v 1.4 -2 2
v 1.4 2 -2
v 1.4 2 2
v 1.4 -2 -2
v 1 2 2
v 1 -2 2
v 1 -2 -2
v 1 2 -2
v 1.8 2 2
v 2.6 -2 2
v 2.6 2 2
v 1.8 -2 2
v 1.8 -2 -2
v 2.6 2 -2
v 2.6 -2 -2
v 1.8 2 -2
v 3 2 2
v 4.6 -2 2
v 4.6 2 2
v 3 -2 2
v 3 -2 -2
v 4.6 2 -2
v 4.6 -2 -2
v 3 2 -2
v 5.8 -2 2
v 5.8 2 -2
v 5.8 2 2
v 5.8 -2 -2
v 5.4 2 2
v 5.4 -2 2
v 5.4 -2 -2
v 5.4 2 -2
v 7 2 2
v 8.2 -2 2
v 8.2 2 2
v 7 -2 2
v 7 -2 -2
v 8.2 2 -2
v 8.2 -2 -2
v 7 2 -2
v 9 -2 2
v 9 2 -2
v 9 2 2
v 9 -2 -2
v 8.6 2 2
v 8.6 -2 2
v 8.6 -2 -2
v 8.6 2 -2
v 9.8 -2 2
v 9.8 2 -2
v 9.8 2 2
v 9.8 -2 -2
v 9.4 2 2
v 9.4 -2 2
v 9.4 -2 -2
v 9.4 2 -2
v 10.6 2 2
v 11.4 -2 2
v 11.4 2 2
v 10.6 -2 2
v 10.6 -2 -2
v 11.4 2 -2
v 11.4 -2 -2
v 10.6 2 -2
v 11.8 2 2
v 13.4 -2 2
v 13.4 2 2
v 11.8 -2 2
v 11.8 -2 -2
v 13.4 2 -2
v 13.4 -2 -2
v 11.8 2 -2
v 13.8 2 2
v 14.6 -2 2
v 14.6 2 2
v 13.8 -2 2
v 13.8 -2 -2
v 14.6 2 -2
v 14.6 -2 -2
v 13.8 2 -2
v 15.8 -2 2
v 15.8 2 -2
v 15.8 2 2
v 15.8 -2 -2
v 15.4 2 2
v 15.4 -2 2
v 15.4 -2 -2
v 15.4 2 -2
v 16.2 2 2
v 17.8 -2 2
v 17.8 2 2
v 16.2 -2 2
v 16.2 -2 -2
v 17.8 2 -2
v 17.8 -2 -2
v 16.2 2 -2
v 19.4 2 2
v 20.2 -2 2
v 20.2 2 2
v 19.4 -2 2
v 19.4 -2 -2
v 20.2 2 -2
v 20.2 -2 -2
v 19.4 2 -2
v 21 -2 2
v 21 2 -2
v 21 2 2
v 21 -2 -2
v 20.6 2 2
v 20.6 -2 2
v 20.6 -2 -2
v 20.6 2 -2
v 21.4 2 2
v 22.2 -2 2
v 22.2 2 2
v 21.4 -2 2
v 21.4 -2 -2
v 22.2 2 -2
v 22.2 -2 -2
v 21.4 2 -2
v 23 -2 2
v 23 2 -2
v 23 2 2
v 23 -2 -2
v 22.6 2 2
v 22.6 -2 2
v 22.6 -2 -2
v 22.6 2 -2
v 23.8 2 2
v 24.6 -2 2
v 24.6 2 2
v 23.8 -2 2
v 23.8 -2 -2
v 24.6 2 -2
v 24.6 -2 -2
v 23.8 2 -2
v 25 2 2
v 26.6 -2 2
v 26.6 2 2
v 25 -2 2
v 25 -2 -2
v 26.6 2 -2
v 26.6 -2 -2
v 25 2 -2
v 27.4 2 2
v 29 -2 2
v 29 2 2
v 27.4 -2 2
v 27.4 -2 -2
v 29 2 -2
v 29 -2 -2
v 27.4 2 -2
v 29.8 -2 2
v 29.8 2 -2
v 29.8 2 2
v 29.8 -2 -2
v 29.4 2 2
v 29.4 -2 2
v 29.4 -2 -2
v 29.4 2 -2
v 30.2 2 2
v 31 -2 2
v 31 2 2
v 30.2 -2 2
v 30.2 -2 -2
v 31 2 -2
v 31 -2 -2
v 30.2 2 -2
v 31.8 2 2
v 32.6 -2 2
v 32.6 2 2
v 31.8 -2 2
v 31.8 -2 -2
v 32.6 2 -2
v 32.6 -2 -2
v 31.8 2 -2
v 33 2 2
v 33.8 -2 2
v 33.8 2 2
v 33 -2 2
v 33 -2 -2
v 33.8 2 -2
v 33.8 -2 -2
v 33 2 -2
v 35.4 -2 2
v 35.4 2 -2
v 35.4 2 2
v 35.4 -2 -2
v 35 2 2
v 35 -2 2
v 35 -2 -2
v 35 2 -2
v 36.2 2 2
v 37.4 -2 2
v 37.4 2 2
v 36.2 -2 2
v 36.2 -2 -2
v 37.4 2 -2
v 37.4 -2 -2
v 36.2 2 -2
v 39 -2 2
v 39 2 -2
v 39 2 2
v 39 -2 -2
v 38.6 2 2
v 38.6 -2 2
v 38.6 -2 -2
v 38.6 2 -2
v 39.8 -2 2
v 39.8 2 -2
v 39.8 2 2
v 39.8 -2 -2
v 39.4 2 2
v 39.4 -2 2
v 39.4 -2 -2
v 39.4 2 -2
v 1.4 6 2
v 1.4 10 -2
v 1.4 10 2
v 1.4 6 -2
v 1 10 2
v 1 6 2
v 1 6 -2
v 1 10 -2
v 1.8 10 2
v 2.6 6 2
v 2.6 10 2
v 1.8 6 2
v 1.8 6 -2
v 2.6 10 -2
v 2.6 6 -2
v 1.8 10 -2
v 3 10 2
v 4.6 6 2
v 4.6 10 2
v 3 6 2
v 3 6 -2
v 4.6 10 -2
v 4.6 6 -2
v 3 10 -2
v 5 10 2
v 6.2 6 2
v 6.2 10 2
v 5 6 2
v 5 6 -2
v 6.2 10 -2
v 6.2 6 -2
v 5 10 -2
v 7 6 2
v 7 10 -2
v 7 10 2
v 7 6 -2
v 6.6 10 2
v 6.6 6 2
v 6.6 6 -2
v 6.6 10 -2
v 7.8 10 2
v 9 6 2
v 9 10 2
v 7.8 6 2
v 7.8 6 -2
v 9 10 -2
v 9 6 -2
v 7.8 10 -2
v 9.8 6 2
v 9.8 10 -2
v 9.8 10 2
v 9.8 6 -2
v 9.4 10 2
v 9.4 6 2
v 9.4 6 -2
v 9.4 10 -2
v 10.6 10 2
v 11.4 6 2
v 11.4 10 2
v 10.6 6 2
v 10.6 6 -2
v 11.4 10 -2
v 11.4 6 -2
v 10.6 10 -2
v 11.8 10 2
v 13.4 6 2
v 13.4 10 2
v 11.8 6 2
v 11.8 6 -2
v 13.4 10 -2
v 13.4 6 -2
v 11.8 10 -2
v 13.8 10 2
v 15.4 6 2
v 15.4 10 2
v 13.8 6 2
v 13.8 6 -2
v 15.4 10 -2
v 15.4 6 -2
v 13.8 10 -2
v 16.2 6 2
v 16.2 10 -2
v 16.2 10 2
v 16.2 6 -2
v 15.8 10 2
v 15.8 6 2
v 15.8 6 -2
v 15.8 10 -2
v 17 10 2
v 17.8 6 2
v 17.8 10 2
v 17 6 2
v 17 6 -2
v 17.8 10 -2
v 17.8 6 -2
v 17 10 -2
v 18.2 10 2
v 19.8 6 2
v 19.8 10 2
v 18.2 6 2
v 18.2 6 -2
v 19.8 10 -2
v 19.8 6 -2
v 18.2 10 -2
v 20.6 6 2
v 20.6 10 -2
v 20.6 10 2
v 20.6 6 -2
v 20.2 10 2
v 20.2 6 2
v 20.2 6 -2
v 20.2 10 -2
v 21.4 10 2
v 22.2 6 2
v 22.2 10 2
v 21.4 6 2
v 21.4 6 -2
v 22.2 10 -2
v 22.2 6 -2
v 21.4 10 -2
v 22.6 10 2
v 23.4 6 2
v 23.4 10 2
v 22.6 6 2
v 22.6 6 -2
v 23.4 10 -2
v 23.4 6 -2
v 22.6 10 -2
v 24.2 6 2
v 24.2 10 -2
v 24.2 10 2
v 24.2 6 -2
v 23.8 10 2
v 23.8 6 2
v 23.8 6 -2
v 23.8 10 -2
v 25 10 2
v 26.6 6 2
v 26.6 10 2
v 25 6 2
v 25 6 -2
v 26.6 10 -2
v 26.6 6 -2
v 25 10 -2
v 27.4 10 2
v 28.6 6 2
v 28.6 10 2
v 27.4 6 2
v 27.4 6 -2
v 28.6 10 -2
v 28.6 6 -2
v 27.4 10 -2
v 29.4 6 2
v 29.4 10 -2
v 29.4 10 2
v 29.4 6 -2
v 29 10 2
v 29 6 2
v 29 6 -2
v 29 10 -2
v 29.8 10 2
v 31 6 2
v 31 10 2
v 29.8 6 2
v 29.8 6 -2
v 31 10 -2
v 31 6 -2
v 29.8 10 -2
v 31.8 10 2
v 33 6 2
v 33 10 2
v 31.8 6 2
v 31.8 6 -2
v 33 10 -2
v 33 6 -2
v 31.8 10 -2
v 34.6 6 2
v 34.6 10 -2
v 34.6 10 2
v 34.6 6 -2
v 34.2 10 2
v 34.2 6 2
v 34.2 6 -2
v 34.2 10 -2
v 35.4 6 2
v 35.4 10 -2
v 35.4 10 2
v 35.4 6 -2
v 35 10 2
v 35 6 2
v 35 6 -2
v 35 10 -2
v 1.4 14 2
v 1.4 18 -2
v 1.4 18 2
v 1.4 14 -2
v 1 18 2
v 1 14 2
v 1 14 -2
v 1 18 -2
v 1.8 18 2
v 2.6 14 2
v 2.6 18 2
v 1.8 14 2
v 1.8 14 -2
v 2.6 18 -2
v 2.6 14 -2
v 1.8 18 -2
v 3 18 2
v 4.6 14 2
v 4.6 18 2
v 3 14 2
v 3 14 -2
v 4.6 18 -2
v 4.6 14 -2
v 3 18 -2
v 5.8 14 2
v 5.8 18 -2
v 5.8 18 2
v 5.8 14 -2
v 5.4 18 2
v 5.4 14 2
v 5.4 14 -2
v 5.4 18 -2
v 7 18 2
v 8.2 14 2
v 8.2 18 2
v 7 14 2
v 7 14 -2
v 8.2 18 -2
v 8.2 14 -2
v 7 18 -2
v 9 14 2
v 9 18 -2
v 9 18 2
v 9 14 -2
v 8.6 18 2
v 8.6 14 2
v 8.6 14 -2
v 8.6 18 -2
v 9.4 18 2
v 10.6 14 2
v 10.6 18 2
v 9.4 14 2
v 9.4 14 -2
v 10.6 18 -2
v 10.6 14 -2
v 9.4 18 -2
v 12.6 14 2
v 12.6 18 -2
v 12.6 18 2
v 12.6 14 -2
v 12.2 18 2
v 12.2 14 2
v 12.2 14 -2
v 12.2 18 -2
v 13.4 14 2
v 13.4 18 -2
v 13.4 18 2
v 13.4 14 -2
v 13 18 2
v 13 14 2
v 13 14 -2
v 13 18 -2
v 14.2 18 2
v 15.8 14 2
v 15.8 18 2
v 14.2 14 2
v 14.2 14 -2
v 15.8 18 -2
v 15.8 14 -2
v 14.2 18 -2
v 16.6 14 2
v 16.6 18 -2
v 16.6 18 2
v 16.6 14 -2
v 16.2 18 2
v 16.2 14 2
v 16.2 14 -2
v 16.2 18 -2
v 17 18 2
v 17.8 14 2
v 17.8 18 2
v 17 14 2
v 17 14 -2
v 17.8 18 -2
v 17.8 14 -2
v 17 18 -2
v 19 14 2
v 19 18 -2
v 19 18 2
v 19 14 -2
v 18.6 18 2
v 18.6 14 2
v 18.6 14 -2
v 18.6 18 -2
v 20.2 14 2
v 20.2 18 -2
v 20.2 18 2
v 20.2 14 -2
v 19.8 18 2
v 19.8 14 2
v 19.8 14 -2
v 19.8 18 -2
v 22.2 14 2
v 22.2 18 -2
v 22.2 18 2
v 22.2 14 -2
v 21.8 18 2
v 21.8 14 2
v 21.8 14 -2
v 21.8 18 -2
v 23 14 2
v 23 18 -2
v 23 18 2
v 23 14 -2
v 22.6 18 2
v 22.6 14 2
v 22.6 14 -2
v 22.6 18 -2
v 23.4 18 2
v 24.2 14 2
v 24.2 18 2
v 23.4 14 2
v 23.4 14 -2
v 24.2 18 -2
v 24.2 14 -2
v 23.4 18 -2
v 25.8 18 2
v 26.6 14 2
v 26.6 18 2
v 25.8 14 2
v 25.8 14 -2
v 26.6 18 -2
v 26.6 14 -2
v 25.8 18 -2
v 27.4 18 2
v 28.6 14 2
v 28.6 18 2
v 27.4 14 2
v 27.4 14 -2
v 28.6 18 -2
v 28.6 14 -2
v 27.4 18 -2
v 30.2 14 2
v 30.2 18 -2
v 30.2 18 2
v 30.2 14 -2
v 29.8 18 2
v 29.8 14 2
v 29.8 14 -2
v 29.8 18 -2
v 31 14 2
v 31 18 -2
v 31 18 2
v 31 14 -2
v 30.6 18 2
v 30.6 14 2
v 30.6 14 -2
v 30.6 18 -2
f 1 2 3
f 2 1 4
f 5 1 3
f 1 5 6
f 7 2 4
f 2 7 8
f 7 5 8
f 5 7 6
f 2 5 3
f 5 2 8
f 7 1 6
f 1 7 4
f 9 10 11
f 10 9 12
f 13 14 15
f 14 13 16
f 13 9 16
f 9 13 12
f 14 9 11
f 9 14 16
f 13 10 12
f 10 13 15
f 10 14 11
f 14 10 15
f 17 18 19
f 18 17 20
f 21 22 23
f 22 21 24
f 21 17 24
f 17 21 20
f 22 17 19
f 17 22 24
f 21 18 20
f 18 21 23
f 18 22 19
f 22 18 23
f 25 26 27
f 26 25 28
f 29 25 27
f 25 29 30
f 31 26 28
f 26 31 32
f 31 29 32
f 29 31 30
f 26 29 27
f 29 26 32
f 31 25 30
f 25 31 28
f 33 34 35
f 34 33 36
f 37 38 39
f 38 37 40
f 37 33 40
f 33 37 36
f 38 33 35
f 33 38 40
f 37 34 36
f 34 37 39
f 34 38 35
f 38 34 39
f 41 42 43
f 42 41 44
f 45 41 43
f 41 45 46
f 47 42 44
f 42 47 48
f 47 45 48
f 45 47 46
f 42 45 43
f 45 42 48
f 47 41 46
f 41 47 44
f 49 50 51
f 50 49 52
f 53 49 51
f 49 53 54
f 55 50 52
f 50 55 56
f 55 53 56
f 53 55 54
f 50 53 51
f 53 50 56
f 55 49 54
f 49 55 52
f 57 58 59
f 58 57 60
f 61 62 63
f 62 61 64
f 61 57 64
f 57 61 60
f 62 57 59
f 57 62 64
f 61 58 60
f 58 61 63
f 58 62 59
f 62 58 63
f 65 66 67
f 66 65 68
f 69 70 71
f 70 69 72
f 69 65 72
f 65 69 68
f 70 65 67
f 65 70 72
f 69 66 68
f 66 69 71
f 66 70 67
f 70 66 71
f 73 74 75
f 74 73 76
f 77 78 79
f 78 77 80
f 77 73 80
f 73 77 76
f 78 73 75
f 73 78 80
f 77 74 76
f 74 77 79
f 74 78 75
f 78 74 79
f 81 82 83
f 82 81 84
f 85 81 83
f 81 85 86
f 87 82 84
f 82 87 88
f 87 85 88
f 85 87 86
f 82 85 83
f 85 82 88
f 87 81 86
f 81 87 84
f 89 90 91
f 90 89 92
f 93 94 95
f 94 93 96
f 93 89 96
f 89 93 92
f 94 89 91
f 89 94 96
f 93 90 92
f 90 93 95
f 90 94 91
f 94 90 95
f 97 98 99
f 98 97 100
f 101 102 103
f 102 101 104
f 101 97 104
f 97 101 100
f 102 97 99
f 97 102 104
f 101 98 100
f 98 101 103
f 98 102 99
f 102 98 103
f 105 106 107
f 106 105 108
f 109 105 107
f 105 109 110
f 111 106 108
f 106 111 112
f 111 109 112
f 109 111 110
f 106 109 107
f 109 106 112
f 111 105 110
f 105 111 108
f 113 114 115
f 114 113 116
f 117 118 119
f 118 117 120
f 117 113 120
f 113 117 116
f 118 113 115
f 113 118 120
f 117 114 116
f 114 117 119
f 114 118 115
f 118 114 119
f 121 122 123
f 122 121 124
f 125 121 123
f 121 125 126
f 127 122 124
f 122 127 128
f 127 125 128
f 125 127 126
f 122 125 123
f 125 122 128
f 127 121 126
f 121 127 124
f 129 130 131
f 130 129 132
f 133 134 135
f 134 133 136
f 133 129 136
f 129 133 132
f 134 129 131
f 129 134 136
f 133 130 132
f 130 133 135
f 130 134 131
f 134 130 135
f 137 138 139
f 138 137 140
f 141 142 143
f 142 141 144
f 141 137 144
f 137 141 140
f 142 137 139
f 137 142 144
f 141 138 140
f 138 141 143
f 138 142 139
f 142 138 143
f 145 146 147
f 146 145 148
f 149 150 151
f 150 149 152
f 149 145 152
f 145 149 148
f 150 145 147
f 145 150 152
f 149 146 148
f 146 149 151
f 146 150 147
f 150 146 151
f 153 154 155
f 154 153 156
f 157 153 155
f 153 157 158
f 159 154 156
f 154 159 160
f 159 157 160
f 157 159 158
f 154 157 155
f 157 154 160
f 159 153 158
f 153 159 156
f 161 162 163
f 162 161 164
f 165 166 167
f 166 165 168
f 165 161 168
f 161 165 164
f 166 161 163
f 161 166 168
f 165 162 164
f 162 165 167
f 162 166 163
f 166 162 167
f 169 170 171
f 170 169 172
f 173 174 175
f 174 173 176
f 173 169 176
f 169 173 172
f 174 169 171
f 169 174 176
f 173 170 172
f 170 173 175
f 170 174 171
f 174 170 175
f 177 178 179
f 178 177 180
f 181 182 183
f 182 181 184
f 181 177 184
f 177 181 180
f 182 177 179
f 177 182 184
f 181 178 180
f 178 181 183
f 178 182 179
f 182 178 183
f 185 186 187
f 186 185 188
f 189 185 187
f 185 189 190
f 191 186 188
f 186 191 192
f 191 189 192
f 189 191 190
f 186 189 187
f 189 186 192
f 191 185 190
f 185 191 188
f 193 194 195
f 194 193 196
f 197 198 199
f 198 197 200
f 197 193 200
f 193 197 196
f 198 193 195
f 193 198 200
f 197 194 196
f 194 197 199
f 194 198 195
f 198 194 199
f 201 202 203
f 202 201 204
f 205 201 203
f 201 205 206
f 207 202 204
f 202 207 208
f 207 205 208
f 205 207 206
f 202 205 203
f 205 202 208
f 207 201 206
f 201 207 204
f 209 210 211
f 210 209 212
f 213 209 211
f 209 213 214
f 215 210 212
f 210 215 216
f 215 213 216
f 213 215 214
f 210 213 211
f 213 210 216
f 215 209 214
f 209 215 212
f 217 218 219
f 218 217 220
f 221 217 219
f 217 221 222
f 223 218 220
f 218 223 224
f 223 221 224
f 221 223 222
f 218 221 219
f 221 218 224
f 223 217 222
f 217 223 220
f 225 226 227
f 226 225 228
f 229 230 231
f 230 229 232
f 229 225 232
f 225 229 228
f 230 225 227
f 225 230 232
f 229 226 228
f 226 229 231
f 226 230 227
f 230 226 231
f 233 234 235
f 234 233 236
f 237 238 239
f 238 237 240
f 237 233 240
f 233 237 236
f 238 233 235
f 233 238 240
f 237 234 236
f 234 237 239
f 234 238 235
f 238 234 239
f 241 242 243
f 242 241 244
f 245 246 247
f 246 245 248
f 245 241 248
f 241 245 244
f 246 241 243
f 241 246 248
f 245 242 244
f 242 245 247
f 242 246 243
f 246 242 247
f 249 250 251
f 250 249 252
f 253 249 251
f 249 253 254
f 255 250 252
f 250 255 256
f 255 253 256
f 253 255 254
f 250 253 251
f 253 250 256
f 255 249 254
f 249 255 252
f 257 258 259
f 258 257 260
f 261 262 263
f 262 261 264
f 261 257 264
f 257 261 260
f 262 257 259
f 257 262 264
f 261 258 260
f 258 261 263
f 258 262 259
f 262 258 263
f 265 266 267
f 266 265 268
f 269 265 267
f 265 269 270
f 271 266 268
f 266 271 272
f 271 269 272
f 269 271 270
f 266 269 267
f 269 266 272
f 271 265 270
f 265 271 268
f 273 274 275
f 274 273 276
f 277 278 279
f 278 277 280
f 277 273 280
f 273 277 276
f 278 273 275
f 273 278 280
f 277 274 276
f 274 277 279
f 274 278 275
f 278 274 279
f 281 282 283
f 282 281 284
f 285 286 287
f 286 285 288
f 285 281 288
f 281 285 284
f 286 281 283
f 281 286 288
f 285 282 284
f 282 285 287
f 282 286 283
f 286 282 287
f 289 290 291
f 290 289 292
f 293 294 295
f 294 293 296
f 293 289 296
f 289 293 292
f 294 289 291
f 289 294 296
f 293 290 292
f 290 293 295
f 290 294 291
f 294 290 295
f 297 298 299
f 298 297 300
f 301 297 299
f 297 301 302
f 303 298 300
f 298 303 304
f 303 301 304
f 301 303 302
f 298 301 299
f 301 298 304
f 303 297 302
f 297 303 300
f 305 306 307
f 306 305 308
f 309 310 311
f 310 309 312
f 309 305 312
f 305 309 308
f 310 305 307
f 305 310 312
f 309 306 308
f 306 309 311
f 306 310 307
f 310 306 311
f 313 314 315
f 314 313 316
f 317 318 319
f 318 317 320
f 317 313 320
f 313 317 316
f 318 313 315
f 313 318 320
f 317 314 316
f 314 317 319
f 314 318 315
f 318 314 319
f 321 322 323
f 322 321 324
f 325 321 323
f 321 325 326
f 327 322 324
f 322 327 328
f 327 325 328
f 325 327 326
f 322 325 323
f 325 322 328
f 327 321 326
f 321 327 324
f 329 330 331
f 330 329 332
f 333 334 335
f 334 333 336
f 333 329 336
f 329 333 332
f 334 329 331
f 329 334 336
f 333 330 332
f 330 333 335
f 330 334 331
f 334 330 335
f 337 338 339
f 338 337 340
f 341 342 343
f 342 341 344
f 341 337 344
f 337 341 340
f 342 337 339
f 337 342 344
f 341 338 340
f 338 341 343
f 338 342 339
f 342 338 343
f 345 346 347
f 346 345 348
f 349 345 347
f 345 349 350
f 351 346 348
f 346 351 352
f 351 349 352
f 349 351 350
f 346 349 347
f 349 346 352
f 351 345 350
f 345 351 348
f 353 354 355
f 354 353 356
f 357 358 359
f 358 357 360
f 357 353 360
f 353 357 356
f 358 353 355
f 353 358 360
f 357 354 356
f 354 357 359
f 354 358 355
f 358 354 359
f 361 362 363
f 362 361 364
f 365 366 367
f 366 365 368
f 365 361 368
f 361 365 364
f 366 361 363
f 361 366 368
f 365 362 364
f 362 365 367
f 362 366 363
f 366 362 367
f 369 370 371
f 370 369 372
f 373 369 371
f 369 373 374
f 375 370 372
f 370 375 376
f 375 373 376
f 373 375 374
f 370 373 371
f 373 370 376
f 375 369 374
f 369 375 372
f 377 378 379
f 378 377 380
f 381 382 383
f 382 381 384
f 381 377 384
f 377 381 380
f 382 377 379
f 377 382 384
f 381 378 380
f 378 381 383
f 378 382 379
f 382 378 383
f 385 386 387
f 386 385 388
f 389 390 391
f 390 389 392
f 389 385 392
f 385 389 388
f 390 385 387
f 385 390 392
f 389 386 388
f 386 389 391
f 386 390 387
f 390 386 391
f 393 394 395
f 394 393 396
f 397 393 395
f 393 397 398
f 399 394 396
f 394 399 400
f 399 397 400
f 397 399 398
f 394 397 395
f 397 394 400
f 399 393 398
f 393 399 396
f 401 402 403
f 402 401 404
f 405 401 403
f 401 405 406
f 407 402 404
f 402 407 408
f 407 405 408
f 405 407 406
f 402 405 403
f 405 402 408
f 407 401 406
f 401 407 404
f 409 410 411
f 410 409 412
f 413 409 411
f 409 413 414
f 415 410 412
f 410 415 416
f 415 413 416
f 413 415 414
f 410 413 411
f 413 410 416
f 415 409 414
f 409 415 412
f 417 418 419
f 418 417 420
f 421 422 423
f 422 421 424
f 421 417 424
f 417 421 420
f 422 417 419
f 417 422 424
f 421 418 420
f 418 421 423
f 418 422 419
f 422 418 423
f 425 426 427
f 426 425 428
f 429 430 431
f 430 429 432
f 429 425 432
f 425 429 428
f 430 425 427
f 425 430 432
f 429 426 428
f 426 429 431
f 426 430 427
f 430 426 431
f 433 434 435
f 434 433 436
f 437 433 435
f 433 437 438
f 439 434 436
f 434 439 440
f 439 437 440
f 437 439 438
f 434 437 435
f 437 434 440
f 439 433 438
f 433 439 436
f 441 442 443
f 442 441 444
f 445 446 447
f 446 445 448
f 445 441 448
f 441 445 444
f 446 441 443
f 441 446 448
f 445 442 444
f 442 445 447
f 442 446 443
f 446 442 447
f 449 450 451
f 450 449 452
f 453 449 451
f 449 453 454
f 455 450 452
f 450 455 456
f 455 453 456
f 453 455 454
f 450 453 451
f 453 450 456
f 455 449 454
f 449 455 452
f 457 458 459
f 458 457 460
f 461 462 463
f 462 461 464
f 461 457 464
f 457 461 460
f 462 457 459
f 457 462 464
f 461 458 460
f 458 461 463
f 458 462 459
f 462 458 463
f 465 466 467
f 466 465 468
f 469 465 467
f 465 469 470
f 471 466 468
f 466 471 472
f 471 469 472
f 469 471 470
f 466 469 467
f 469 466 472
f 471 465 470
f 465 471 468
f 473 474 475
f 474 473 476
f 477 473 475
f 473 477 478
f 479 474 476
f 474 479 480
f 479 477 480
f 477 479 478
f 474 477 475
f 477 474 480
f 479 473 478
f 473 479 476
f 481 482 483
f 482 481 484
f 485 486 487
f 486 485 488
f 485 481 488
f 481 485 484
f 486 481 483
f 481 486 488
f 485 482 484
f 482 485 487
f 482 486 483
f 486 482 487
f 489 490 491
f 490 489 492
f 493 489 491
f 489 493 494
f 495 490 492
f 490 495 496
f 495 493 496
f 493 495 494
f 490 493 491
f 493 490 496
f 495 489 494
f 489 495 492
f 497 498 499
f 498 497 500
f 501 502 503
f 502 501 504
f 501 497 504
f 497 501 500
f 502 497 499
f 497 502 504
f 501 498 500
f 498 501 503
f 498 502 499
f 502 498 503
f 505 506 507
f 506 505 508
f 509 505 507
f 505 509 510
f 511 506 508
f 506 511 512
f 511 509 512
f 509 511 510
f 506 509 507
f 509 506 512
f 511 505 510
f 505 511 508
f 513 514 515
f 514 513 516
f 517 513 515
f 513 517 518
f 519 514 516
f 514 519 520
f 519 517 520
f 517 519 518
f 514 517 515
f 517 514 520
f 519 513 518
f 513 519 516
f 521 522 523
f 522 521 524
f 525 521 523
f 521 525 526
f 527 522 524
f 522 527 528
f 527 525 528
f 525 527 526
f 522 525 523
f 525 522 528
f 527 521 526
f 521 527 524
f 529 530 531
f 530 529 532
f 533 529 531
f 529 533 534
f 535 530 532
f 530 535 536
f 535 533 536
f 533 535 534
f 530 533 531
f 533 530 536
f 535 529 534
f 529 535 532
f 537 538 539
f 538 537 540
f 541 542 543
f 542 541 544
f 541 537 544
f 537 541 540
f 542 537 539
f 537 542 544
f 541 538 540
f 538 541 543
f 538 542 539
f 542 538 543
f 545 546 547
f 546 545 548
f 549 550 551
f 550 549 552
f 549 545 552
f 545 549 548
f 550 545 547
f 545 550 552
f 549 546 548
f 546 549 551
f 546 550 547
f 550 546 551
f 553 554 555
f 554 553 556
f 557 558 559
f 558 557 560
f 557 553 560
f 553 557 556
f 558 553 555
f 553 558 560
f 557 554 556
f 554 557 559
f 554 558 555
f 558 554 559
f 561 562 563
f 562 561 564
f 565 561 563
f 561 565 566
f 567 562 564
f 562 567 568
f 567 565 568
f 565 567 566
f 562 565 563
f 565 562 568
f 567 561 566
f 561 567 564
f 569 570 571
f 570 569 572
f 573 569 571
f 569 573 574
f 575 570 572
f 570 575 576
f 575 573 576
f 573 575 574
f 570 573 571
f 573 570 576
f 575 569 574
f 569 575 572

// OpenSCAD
translate([1.2,0,0])  cube(size = [0.4,4,4], center=true);
translate([2,0,0])  cube(size = [0.4,4,4], center=true);
translate([2.4,0,0])  cube(size = [0.4,4,4], center=true);
translate([3.2,0,0])  cube(size = [0.4,4,4], center=true);
translate([3.6,0,0])  cube(size = [0.4,4,4], center=true);
translate([4,0,0])  cube(size = [0.4,4,4], center=true);
translate([4.4,0,0])  cube(size = [0.4,4,4], center=true);
translate([5.6,0,0])  cube(size = [0.4,4,4], center=true);
translate([7.2,0,0])  cube(size = [0.4,4,4], center=true);
translate([7.6,0,0])  cube(size = [0.4,4,4], center=true);
translate([8,0,0])  cube(size = [0.4,4,4], center=true);
translate([8.8,0,0])  cube(size = [0.4,4,4], center=true);
translate([9.6,0,0])  cube(size = [0.4,4,4], center=true);
translate([10.8,0,0])  cube(size = [0.4,4,4], center=true);
translate([11.2,0,0])  cube(size = [0.4,4,4], center=true);
translate([12,0,0])  cube(size = [0.4,4,4], center=true);
translate([12.4,0,0])  cube(size = [0.4,4,4], center=true);
translate([12.8,0,0])  cube(size = [0.4,4,4], center=true);
translate([13.2,0,0])  cube(size = [0.4,4,4], center=true);
translate([14,0,0])  cube(size = [0.4,4,4], center=true);
translate([14.4,0,0])  cube(size = [0.4,4,4], center=true);
translate([15.6,0,0])  cube(size = [0.4,4,4], center=true);
translate([16.4,0,0])  cube(size = [0.4,4,4], center=true);
translate([16.8,0,0])  cube(size = [0.4,4,4], center=true);
translate([17.2,0,0])  cube(size = [0.4,4,4], center=true);
translate([17.6,0,0])  cube(size = [0.4,4,4], center=true);
translate([19.6,0,0])  cube(size = [0.4,4,4], center=true);
translate([20,0,0])  cube(size = [0.4,4,4], center=true);
translate([20.8,0,0])  cube(size = [0.4,4,4], center=true);
translate([21.6,0,0])  cube(size = [0.4,4,4], center=true);
translate([22,0,0])  cube(size = [0.4,4,4], center=true);
translate([22.8,0,0])  cube(size = [0.4,4,4], center=true);
translate([24,0,0])  cube(size = [0.4,4,4], center=true);
translate([24.4,0,0])  cube(size = [0.4,4,4], center=true);
translate([25.2,0,0])  cube(size = [0.4,4,4], center=true);
translate([25.6,0,0])  cube(size = [0.4,4,4], center=true);
translate([26,0,0])  cube(size = [0.4,4,4], center=true);
translate([26.4,0,0])  cube(size = [0.4,4,4], center=true);
translate([27.6,0,0])  cube(size = [0.4,4,4], center=true);
translate([28,0,0])  cube(size = [0.4,4,4], center=true);
translate([28.4,0,0])  cube(size = [0.4,4,4], center=true);
translate([28.8,0,0])  cube(size = [0.4,4,4], center=true);
translate([29.6,0,0])  cube(size = [0.4,4,4], center=true);
translate([30.4,0,0])  cube(size = [0.4,4,4], center=true);
translate([30.8,0,0])  cube(size = [0.4,4,4], center=true);
translate([32,0,0])  cube(size = [0.4,4,4], center=true);
translate([32.4,0,0])  cube(size = [0.4,4,4], center=true);
translate([33.2,0,0])  cube(size = [0.4,4,4], center=true);
translate([33.6,0,0])  cube(size = [0.4,4,4], center=true);
translate([35.2,0,0])  cube(size = [0.4,4,4], center=true);
translate([36.4,0,0])  cube(size = [0.4,4,4], center=true);
translate([36.8,0,0])  cube(size = [0.4,4,4], center=true);
translate([37.2,0,0])  cube(size = [0.4,4,4], center=true);
translate([38.8,0,0])  cube(size = [0.4,4,4], center=true);
translate([39.6,0,0])  cube(size = [0.4,4,4], center=true);
translate([1.2,8,0])  cube(size = [0.4,4,4], center=true);
translate([2,8,0])  cube(size = [0.4,4,4], center=true);
translate([2.4,8,0])  cube(size = [0.4,4,4], center=true);
translate([3.2,8,0])  cube(size = [0.4,4,4], center=true);
translate([3.6,8,0])  cube(size = [0.4,4,4], center=true);
translate([4,8,0])  cube(size = [0.4,4,4], center=true);
translate([4.4,8,0])  cube(size = [0.4,4,4], center=true);
translate([5.2,8,0])  cube(size = [0.4,4,4], center=true);
translate([5.6,8,0])  cube(size = [0.4,4,4], center=true);
translate([6,8,0])  cube(size = [0.4,4,4], center=true);
translate([6.8,8,0])  cube(size = [0.4,4,4], center=true);
translate([8,8,0])  cube(size = [0.4,4,4], center=true);
translate([8.4,8,0])  cube(size = [0.4,4,4], center=true);
translate([8.8,8,0])  cube(size = [0.4,4,4], center=true);
translate([9.6,8,0])  cube(size = [0.4,4,4], center=true);
translate([10.8,8,0])  cube(size = [0.4,4,4], center=true);
translate([11.2,8,0])  cube(size = [0.4,4,4], center=true);
translate([12,8,0])  cube(size = [0.4,4,4], center=true);
translate([12.4,8,0])  cube(size = [0.4,4,4], center=true);
translate([12.8,8,0])  cube(size = [0.4,4,4], center=true);
translate([13.2,8,0])  cube(size = [0.4,4,4], center=true);
translate([14,8,0])  cube(size = [0.4,4,4], center=true);
translate([14.4,8,0])  cube(size = [0.4,4,4], center=true);
translate([14.8,8,0])  cube(size = [0.4,4,4], center=true);
translate([15.2,8,0])  cube(size = [0.4,4,4], center=true);
translate([16,8,0])  cube(size = [0.4,4,4], center=true);
translate([17.2,8,0])  cube(size = [0.4,4,4], center=true);
translate([17.6,8,0])  cube(size = [0.4,4,4], center=true);
translate([18.4,8,0])  cube(size = [0.4,4,4], center=true);
translate([18.8,8,0])  cube(size = [0.4,4,4], center=true);
translate([19.2,8,0])  cube(size = [0.4,4,4], center=true);
translate([19.6,8,0])  cube(size = [0.4,4,4], center=true);
translate([20.4,8,0])  cube(size = [0.4,4,4], center=true);
translate([21.6,8,0])  cube(size = [0.4,4,4], center=true);
translate([22,8,0])  cube(size = [0.4,4,4], center=true);
translate([22.8,8,0])  cube(size = [0.4,4,4], center=true);
translate([23.2,8,0])  cube(size = [0.4,4,4], center=true);
translate([24,8,0])  cube(size = [0.4,4,4], center=true);
translate([25.2,8,0])  cube(size = [0.4,4,4], center=true);
translate([25.6,8,0])  cube(size = [0.4,4,4], center=true);
translate([26,8,0])  cube(size = [0.4,4,4], center=true);
translate([26.4,8,0])  cube(size = [0.4,4,4], center=true);
translate([27.6,8,0])  cube(size = [0.4,4,4], center=true);
translate([28,8,0])  cube(size = [0.4,4,4], center=true);
translate([28.4,8,0])  cube(size = [0.4,4,4], center=true);
translate([29.2,8,0])  cube(size = [0.4,4,4], center=true);
translate([30,8,0])  cube(size = [0.4,4,4], center=true);
translate([30.4,8,0])  cube(size = [0.4,4,4], center=true);
translate([30.8,8,0])  cube(size = [0.4,4,4], center=true);
translate([32,8,0])  cube(size = [0.4,4,4], center=true);
translate([32.4,8,0])  cube(size = [0.4,4,4], center=true);
translate([32.8,8,0])  cube(size = [0.4,4,4], center=true);
translate([34.4,8,0])  cube(size = [0.4,4,4], center=true);
translate([35.2,8,0])  cube(size = [0.4,4,4], center=true);
translate([1.2,16,0])  cube(size = [0.4,4,4], center=true);
translate([2,16,0])  cube(size = [0.4,4,4], center=true);
translate([2.4,16,0])  cube(size = [0.4,4,4], center=true);
translate([3.2,16,0])  cube(size = [0.4,4,4], center=true);
translate([3.6,16,0])  cube(size = [0.4,4,4], center=true);
translate([4,16,0])  cube(size = [0.4,4,4], center=true);
translate([4.4,16,0])  cube(size = [0.4,4,4], center=true);
translate([5.6,16,0])  cube(size = [0.4,4,4], center=true);
translate([7.2,16,0])  cube(size = [0.4,4,4], center=true);
translate([7.6,16,0])  cube(size = [0.4,4,4], center=true);
translate([8,16,0])  cube(size = [0.4,4,4], center=true);
translate([8.8,16,0])  cube(size = [0.4,4,4], center=true);
translate([9.6,16,0])  cube(size = [0.4,4,4], center=true);
translate([10,16,0])  cube(size = [0.4,4,4], center=true);
translate([10.4,16,0])  cube(size = [0.4,4,4], center=true);
translate([12.4,16,0])  cube(size = [0.4,4,4], center=true);
translate([13.2,16,0])  cube(size = [0.4,4,4], center=true);
translate([14.4,16,0])  cube(size = [0.4,4,4], center=true);
translate([14.8,16,0])  cube(size = [0.4,4,4], center=true);
translate([15.2,16,0])  cube(size = [0.4,4,4], center=true);
translate([15.6,16,0])  cube(size = [0.4,4,4], center=true);
translate([16.4,16,0])  cube(size = [0.4,4,4], center=true);
translate([17.2,16,0])  cube(size = [0.4,4,4], center=true);
translate([17.6,16,0])  cube(size = [0.4,4,4], center=true);
translate([18.8,16,0])  cube(size = [0.4,4,4], center=true);
translate([20,16,0])  cube(size = [0.4,4,4], center=true);
translate([22,16,0])  cube(size = [0.4,4,4], center=true);
translate([22.8,16,0])  cube(size = [0.4,4,4], center=true);
translate([23.6,16,0])  cube(size = [0.4,4,4], center=true);
translate([24,16,0])  cube(size = [0.4,4,4], center=true);
translate([26,16,0])  cube(size = [0.4,4,4], center=true);
translate([26.4,16,0])  cube(size = [0.4,4,4], center=true);
translate([27.6,16,0])  cube(size = [0.4,4,4], center=true);
translate([28,16,0])  cube(size = [0.4,4,4], center=true);
translate([28.4,16,0])  cube(size = [0.4,4,4], center=true);
translate([30,16,0])  cube(size = [0.4,4,4], center=true);
translate([30.8,16,0])  cube(size = [0.4,4,4], center=true);
